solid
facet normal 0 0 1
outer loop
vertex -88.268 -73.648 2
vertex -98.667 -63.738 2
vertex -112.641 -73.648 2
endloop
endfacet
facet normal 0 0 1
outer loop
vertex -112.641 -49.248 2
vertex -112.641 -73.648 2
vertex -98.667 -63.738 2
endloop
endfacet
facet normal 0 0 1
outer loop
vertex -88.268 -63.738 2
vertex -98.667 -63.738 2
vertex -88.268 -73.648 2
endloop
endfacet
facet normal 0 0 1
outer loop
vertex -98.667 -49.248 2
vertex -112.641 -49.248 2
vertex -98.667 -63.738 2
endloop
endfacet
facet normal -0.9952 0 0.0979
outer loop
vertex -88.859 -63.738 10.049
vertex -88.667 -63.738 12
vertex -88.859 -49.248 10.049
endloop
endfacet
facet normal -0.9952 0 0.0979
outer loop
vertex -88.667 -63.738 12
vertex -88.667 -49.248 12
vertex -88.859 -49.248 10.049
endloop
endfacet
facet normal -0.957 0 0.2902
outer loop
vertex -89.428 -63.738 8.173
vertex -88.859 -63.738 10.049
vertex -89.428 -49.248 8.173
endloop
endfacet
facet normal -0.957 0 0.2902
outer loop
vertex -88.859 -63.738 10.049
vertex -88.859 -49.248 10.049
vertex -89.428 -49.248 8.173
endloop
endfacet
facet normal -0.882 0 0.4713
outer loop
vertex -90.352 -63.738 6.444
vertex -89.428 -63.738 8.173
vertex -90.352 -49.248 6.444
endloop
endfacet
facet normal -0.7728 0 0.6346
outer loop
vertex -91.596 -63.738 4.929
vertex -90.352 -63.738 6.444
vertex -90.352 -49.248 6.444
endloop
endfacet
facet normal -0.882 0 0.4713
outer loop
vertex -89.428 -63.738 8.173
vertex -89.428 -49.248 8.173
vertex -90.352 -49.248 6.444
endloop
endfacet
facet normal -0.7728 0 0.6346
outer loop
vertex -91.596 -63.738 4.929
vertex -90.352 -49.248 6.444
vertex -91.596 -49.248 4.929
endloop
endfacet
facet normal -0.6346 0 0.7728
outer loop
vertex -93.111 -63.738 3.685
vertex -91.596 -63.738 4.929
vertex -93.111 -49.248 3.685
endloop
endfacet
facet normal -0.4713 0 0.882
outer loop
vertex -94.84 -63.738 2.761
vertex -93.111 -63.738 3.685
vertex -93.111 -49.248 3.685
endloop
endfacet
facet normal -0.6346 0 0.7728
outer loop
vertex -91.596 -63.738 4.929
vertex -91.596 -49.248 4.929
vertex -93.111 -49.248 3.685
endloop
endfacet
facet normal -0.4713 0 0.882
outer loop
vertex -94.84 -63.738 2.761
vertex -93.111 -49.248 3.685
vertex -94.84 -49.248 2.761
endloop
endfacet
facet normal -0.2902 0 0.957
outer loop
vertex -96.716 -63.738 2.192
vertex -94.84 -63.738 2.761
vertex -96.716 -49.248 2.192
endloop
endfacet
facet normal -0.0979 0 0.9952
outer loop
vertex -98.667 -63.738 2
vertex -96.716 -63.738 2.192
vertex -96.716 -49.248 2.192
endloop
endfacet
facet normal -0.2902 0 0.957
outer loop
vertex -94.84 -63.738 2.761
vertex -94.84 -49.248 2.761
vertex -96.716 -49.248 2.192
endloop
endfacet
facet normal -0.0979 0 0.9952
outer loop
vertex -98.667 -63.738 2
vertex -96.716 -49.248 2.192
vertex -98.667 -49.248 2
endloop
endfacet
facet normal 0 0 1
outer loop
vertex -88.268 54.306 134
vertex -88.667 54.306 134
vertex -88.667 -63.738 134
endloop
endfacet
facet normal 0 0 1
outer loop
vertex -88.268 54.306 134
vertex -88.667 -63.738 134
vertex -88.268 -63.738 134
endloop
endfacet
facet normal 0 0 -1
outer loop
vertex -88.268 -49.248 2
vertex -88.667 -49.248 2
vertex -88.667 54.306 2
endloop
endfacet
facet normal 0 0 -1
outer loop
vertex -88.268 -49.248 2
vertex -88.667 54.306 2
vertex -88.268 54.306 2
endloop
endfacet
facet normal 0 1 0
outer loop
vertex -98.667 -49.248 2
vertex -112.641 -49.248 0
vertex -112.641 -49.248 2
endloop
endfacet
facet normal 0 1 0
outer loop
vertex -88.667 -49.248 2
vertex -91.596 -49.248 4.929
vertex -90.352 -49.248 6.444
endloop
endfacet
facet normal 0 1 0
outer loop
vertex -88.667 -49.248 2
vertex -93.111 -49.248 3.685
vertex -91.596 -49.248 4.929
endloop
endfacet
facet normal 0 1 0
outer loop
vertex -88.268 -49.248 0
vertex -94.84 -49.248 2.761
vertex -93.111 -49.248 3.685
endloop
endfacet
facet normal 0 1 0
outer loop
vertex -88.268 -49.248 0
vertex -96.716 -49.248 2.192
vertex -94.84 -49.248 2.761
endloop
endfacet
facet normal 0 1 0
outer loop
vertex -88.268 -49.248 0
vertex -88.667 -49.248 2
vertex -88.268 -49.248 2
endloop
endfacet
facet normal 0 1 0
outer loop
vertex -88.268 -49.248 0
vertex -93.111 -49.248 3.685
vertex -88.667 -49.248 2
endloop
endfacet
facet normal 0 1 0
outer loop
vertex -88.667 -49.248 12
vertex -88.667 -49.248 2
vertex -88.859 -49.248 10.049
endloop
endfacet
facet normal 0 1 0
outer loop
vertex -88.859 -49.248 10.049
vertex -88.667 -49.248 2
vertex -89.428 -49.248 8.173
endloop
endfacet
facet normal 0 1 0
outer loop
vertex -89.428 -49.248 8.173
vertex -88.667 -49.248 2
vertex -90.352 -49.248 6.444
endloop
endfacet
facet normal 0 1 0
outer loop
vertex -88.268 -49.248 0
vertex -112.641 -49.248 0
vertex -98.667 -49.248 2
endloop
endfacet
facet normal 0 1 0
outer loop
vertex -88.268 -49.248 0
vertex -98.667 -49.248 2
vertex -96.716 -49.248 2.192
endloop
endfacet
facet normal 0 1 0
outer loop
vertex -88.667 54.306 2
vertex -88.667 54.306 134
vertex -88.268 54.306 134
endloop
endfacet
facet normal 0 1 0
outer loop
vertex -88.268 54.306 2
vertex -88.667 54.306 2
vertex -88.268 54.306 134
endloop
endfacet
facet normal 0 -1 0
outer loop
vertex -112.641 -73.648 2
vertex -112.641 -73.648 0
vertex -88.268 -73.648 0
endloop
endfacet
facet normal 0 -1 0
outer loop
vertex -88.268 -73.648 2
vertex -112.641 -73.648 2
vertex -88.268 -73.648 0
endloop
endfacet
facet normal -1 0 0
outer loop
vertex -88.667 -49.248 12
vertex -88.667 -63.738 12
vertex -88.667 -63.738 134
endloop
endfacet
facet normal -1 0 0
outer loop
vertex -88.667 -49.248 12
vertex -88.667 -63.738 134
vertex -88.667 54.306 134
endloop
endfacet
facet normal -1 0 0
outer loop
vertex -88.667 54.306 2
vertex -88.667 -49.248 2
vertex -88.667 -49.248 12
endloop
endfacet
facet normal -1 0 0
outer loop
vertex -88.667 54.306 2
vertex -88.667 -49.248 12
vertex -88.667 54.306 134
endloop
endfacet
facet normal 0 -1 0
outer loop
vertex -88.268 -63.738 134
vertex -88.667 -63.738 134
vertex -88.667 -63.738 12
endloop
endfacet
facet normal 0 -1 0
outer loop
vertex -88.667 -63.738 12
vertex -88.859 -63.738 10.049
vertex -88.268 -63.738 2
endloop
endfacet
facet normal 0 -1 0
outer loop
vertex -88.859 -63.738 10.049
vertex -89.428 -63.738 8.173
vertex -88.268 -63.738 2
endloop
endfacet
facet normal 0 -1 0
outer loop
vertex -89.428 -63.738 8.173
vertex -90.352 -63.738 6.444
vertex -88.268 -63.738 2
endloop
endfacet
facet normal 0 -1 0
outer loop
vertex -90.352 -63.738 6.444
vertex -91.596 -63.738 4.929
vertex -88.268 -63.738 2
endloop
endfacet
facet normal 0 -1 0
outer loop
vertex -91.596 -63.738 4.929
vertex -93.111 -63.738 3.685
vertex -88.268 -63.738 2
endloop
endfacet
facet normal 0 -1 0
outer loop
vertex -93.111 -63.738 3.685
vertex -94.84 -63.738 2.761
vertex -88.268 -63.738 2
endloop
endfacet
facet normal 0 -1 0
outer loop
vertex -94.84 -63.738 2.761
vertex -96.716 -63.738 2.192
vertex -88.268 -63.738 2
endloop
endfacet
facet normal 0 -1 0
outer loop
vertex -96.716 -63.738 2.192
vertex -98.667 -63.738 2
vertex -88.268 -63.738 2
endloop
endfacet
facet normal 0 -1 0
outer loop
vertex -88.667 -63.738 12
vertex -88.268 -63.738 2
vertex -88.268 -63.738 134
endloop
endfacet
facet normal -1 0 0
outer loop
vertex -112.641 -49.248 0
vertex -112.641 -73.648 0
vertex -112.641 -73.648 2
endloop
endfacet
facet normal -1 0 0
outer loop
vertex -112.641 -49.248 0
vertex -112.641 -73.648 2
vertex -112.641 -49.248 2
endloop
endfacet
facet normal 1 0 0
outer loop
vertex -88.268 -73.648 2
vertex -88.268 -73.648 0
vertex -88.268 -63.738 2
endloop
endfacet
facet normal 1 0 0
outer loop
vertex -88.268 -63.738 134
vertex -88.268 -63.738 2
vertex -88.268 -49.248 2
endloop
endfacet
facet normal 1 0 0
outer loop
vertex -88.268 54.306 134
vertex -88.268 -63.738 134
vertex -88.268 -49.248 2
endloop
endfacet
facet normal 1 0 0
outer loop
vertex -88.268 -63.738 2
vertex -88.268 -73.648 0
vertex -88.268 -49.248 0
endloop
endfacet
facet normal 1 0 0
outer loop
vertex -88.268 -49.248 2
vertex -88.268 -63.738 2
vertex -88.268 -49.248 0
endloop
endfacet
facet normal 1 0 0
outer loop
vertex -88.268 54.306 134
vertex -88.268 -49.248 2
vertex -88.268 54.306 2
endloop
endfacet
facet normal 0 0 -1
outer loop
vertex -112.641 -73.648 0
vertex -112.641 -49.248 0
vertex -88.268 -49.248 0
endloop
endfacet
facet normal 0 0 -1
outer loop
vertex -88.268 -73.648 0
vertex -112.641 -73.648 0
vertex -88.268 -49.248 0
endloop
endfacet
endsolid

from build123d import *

# Parameters (mm, degrees)
SKETCH_1_W      = 24.373693789
SKETCH_1_H      = 24.4
EXTRUDE_1_DEPTH = 2
SKETCH_2_W      = 0.399318558
SKETCH_2_H      = 118.043550316
EXTRUDE_2_DEPTH = 132
FILLET_1_R      = 10


with BuildPart() as part:
    # 草图1 → 凸台-拉伸1 (new body)
    with BuildSketch(Plane.XY):
        with Locations((-100.454369689, -61.448491789)):
            Rectangle(SKETCH_1_W, SKETCH_1_H)
    extrude(amount=EXTRUDE_1_DEPTH)

    # 草图2 → 凸台-拉伸2 (add)
    with BuildSketch(Plane.XY.offset(2)):
        with Locations((-88.467182073, -4.716082398)):
            Rectangle(SKETCH_2_W, SKETCH_2_H)
    extrude(amount=EXTRUDE_2_DEPTH)

    # 圆角1
    fillet_1_edges = [part.edges().sort_by_distance(p)[0] for p in [
        (-88.666841352, -56.493174673, 2),
    ]]
    fillet(fillet_1_edges, radius=FILLET_1_R)


solid = part.part
